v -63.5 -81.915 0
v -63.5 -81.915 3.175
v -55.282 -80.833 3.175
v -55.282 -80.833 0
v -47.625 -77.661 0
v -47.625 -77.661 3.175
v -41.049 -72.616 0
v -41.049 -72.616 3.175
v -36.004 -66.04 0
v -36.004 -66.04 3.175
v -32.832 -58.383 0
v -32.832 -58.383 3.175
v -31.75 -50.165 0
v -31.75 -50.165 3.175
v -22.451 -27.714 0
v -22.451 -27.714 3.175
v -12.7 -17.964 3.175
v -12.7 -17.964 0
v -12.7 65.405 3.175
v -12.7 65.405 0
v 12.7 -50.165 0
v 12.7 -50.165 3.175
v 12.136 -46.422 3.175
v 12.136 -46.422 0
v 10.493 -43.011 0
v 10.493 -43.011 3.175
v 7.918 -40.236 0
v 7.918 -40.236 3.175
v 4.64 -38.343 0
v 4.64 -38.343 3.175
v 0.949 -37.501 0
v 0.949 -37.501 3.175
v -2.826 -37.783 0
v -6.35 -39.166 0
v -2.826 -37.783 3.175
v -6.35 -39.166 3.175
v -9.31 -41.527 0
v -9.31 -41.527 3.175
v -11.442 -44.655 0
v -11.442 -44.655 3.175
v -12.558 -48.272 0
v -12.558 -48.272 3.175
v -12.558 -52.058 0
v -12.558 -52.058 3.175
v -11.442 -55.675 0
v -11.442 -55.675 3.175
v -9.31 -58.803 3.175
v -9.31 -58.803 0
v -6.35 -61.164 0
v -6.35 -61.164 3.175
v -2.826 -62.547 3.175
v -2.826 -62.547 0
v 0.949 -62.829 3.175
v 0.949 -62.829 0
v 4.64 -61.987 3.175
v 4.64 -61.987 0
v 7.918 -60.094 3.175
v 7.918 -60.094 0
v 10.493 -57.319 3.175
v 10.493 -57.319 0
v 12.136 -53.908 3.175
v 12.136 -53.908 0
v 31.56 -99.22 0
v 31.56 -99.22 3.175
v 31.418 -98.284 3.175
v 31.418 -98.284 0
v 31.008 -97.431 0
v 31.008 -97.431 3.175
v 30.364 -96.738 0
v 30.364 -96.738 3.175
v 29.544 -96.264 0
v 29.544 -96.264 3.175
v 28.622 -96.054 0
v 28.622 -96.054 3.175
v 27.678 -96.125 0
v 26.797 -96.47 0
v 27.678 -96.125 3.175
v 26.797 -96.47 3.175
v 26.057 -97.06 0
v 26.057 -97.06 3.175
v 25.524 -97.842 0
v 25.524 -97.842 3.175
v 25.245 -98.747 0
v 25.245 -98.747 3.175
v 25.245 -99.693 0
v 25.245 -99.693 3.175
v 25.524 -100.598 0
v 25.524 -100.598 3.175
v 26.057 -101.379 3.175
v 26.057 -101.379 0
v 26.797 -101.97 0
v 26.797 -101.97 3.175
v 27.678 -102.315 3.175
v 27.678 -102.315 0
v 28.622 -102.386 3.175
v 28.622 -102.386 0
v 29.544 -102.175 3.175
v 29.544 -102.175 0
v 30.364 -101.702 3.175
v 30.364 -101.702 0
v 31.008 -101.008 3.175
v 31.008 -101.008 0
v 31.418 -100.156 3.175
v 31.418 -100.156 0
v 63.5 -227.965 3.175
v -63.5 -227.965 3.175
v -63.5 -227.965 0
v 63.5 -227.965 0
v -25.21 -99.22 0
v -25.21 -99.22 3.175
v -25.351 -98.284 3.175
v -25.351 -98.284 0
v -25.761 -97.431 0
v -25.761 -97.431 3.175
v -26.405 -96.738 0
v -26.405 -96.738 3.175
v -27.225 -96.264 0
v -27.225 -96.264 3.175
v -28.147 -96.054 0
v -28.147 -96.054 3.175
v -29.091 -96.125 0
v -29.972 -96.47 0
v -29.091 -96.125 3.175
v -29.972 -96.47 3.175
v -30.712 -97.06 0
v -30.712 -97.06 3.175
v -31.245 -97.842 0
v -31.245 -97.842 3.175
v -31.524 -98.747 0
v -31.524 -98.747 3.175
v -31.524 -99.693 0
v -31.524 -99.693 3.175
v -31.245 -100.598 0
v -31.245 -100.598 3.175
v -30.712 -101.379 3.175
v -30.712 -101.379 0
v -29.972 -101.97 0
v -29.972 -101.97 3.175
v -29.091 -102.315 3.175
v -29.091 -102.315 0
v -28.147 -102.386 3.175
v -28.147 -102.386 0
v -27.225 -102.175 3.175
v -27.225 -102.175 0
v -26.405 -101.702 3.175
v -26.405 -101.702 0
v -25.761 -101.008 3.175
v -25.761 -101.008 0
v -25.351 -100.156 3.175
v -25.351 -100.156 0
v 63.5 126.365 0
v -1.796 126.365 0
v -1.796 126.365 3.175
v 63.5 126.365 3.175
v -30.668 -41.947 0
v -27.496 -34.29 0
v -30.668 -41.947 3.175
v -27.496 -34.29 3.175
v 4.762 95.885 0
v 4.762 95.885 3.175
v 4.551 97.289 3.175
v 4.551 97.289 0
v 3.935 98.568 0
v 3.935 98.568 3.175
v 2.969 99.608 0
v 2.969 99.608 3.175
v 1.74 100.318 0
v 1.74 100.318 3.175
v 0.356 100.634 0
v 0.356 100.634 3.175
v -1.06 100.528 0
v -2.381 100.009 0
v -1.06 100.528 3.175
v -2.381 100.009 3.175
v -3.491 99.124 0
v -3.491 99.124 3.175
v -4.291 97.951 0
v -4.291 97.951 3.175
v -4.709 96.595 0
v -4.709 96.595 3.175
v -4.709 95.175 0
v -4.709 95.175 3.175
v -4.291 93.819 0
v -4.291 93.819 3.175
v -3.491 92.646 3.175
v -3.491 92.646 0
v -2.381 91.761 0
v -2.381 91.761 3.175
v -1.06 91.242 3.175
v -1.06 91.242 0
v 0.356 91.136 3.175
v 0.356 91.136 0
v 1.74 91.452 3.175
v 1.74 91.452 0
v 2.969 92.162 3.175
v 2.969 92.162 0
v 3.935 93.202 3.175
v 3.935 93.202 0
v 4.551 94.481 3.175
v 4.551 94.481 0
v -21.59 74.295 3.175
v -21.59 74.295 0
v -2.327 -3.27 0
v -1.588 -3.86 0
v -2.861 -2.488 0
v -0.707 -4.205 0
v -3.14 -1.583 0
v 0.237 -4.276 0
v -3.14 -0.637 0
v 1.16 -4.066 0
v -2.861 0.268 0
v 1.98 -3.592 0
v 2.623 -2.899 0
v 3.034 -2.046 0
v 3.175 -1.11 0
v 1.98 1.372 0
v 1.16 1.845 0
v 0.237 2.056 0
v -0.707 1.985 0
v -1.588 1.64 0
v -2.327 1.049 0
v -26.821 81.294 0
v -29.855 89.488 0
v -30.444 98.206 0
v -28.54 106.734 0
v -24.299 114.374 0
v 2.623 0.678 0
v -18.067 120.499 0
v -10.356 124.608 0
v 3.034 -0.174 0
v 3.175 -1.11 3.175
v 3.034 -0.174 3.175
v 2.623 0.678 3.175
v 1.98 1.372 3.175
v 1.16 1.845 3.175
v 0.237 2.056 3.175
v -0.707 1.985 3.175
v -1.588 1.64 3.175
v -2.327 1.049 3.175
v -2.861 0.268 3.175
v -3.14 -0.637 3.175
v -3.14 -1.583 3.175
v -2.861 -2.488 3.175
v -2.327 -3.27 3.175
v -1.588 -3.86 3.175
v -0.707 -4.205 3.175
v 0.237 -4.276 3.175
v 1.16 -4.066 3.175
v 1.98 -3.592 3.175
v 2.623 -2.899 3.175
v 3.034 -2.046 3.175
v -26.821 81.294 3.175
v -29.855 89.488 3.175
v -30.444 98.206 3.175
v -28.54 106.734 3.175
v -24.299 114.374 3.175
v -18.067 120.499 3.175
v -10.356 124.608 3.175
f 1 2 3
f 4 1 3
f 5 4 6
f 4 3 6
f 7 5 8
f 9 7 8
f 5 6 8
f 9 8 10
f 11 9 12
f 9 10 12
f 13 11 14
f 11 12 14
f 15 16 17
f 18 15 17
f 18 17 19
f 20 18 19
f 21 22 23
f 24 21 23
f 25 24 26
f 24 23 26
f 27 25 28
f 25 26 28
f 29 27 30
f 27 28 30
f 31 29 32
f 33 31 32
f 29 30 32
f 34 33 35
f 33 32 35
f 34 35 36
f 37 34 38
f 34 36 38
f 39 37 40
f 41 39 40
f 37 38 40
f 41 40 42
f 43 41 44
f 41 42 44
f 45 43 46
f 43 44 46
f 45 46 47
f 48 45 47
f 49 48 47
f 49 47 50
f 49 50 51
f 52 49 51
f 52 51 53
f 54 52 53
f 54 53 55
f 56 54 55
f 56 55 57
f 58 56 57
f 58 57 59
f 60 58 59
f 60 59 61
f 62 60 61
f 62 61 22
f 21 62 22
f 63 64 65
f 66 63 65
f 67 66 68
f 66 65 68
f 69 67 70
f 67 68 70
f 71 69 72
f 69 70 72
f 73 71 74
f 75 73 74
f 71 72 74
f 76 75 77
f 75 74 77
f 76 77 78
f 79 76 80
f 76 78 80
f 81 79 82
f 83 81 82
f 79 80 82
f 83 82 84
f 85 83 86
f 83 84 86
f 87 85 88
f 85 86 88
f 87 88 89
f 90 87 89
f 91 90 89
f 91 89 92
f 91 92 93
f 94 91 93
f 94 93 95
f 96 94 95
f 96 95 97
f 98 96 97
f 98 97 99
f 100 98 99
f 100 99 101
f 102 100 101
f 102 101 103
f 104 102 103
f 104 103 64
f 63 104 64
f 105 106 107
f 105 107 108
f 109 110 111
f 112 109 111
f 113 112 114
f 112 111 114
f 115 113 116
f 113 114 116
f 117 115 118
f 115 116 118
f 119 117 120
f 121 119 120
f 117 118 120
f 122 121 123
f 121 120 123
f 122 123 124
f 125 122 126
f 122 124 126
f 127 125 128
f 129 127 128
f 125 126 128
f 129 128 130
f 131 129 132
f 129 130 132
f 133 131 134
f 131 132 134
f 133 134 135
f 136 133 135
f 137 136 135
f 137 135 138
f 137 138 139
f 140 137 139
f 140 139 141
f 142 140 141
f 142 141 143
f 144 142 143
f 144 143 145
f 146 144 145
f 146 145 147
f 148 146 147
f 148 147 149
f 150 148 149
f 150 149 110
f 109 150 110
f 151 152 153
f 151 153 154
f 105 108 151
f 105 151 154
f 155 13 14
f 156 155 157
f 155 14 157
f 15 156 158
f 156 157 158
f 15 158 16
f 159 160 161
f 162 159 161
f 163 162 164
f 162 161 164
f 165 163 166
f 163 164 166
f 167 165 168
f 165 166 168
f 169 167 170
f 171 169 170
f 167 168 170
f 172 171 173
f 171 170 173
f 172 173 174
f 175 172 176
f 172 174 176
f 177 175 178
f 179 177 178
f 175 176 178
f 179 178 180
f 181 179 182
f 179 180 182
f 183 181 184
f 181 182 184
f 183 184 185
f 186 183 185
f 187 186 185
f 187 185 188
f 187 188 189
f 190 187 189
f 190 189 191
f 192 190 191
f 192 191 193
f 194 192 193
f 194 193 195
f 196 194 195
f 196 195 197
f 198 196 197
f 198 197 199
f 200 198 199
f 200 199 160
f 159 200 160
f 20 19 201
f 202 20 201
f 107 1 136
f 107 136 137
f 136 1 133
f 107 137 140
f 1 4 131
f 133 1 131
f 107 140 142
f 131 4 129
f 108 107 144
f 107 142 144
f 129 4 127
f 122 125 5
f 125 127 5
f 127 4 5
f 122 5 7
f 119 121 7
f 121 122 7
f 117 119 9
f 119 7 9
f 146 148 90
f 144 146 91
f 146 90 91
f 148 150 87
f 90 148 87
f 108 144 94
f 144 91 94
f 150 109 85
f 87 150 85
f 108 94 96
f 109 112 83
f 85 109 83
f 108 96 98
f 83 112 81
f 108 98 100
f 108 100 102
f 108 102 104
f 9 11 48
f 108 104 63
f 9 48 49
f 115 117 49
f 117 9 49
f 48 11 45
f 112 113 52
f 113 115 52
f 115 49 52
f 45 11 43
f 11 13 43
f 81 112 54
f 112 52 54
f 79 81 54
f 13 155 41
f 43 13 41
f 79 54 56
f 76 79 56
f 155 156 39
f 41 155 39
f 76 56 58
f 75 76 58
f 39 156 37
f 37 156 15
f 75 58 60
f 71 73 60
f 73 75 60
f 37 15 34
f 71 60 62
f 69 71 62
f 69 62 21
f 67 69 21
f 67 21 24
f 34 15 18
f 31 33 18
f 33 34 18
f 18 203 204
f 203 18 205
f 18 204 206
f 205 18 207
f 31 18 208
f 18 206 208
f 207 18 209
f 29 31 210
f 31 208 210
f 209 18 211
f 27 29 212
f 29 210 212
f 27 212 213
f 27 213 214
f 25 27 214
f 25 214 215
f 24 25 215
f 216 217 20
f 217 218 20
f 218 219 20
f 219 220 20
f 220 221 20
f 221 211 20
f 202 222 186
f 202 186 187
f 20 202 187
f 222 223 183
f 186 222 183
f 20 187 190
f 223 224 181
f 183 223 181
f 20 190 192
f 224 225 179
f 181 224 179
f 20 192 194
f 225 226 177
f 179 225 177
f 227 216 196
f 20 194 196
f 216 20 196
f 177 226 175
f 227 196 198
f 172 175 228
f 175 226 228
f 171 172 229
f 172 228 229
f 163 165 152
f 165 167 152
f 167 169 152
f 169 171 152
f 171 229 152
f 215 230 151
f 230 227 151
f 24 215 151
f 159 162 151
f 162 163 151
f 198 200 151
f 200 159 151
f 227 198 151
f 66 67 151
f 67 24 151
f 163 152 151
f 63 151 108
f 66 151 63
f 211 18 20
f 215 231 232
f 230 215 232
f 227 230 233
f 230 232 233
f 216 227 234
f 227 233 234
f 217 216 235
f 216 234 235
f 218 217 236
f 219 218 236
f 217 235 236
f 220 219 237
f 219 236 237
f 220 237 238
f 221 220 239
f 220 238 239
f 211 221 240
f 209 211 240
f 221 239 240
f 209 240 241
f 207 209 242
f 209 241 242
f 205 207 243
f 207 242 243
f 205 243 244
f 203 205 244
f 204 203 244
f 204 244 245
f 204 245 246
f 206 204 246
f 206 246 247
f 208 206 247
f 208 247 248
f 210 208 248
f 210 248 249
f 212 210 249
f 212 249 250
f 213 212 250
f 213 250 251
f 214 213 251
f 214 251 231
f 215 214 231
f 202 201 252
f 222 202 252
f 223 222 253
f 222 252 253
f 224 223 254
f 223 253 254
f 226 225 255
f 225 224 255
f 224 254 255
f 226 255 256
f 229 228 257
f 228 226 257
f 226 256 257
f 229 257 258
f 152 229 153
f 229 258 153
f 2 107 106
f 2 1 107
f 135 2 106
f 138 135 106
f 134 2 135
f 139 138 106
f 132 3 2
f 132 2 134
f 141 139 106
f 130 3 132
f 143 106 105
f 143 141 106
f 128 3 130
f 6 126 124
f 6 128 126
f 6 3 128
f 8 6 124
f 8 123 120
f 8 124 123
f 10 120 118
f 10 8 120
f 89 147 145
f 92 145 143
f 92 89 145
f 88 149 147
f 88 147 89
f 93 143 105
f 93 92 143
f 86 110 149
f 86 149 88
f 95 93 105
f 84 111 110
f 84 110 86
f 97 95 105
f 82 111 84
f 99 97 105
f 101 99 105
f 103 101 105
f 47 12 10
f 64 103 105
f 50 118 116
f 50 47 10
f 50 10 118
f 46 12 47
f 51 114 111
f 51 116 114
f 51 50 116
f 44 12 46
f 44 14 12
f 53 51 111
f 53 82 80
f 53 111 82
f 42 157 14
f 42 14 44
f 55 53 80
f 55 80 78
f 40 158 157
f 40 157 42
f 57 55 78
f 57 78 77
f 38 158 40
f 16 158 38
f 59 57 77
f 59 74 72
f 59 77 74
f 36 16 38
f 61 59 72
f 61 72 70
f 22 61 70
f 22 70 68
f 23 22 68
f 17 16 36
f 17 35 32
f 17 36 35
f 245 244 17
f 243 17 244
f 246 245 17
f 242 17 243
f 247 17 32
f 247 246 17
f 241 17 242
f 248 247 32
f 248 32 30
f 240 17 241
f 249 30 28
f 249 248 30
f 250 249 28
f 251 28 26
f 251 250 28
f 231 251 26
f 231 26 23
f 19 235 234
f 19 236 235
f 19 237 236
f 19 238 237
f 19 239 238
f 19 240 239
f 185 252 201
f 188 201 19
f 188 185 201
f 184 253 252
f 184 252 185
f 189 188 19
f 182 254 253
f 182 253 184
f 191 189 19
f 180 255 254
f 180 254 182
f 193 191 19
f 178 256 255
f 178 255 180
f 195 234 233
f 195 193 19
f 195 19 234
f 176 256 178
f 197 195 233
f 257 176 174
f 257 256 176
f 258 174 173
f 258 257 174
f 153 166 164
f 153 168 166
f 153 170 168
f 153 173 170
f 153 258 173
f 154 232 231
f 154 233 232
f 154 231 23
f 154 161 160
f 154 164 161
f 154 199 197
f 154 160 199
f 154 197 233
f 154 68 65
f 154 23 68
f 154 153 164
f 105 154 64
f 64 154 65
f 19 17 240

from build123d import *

# Parameters (mm, degrees)
F0_W     = 127
F0_H     = 252.73
F1_DEPTH = 3.175
F2_R     = 12.7
F2_R_2   = 3.175
F2_R_3   = 4.7625
F3_DEPTH = 3.176
F4_W     = 127
F4_H     = 3.175
F5_DEPTH = 101.6


with BuildPart() as f1:
    # F0 (on Top) → F1 (new body)
    with BuildSketch(Plane.XY):
        Rectangle(F0_W, F0_H)
    extrude(amount=F1_DEPTH)

    # F2 (on face) → F3 (cut, through all)
    with BuildSketch(Plane.XY.offset(3.175)):
        with BuildLine():
            Line((-12.7, 65.405), (-21.59, 74.295))
            ThreePointArc((-21.59, 74.295), (-28.540289, 106.734338), (-1.796051, 126.365))
            Line((-1.796051, 126.365), (-63.5, 126.365))
            Line((-63.5, 126.365), (-63.5, 116.205))
            Line((-63.5, 116.205), (-63.5, -69.215))
            Line((-63.5, -69.215), (-63.5, -81.915))
            ThreePointArc((-63.5, -81.915), (-41.04936, -72.61564), (-31.75, -50.165))
            ThreePointArc((-31.75, -50.165), (-29.333175, -38.014801), (-22.45064, -27.71436))
            Line((-22.45064, -27.71436), (-12.7, -17.963719))
            Line((-12.7, -17.963719), (-12.7, 65.405))
        make_face()
        with Locations((0, -50.165)):
            Circle(F2_R)
        with Locations((28.3845, -99.219948)):
            Circle(F2_R_2)
        with Locations((-28.3845, -99.219948)):
            Circle(F2_R_2)
        with Locations((0, -1.110052)):
            Circle(F2_R_2)
        with Locations((0, 95.885)):
            Circle(F2_R_3)
    extrude(amount=-F3_DEPTH, mode=Mode.SUBTRACT)

    # F4 (on face) → F5 (join)
    with BuildSketch(Plane.XZ.offset(126.365)):
        with Locations((0, 1.5875)):
            Rectangle(F4_W, F4_H)
    extrude(amount=F5_DEPTH)


solid = f1.part
